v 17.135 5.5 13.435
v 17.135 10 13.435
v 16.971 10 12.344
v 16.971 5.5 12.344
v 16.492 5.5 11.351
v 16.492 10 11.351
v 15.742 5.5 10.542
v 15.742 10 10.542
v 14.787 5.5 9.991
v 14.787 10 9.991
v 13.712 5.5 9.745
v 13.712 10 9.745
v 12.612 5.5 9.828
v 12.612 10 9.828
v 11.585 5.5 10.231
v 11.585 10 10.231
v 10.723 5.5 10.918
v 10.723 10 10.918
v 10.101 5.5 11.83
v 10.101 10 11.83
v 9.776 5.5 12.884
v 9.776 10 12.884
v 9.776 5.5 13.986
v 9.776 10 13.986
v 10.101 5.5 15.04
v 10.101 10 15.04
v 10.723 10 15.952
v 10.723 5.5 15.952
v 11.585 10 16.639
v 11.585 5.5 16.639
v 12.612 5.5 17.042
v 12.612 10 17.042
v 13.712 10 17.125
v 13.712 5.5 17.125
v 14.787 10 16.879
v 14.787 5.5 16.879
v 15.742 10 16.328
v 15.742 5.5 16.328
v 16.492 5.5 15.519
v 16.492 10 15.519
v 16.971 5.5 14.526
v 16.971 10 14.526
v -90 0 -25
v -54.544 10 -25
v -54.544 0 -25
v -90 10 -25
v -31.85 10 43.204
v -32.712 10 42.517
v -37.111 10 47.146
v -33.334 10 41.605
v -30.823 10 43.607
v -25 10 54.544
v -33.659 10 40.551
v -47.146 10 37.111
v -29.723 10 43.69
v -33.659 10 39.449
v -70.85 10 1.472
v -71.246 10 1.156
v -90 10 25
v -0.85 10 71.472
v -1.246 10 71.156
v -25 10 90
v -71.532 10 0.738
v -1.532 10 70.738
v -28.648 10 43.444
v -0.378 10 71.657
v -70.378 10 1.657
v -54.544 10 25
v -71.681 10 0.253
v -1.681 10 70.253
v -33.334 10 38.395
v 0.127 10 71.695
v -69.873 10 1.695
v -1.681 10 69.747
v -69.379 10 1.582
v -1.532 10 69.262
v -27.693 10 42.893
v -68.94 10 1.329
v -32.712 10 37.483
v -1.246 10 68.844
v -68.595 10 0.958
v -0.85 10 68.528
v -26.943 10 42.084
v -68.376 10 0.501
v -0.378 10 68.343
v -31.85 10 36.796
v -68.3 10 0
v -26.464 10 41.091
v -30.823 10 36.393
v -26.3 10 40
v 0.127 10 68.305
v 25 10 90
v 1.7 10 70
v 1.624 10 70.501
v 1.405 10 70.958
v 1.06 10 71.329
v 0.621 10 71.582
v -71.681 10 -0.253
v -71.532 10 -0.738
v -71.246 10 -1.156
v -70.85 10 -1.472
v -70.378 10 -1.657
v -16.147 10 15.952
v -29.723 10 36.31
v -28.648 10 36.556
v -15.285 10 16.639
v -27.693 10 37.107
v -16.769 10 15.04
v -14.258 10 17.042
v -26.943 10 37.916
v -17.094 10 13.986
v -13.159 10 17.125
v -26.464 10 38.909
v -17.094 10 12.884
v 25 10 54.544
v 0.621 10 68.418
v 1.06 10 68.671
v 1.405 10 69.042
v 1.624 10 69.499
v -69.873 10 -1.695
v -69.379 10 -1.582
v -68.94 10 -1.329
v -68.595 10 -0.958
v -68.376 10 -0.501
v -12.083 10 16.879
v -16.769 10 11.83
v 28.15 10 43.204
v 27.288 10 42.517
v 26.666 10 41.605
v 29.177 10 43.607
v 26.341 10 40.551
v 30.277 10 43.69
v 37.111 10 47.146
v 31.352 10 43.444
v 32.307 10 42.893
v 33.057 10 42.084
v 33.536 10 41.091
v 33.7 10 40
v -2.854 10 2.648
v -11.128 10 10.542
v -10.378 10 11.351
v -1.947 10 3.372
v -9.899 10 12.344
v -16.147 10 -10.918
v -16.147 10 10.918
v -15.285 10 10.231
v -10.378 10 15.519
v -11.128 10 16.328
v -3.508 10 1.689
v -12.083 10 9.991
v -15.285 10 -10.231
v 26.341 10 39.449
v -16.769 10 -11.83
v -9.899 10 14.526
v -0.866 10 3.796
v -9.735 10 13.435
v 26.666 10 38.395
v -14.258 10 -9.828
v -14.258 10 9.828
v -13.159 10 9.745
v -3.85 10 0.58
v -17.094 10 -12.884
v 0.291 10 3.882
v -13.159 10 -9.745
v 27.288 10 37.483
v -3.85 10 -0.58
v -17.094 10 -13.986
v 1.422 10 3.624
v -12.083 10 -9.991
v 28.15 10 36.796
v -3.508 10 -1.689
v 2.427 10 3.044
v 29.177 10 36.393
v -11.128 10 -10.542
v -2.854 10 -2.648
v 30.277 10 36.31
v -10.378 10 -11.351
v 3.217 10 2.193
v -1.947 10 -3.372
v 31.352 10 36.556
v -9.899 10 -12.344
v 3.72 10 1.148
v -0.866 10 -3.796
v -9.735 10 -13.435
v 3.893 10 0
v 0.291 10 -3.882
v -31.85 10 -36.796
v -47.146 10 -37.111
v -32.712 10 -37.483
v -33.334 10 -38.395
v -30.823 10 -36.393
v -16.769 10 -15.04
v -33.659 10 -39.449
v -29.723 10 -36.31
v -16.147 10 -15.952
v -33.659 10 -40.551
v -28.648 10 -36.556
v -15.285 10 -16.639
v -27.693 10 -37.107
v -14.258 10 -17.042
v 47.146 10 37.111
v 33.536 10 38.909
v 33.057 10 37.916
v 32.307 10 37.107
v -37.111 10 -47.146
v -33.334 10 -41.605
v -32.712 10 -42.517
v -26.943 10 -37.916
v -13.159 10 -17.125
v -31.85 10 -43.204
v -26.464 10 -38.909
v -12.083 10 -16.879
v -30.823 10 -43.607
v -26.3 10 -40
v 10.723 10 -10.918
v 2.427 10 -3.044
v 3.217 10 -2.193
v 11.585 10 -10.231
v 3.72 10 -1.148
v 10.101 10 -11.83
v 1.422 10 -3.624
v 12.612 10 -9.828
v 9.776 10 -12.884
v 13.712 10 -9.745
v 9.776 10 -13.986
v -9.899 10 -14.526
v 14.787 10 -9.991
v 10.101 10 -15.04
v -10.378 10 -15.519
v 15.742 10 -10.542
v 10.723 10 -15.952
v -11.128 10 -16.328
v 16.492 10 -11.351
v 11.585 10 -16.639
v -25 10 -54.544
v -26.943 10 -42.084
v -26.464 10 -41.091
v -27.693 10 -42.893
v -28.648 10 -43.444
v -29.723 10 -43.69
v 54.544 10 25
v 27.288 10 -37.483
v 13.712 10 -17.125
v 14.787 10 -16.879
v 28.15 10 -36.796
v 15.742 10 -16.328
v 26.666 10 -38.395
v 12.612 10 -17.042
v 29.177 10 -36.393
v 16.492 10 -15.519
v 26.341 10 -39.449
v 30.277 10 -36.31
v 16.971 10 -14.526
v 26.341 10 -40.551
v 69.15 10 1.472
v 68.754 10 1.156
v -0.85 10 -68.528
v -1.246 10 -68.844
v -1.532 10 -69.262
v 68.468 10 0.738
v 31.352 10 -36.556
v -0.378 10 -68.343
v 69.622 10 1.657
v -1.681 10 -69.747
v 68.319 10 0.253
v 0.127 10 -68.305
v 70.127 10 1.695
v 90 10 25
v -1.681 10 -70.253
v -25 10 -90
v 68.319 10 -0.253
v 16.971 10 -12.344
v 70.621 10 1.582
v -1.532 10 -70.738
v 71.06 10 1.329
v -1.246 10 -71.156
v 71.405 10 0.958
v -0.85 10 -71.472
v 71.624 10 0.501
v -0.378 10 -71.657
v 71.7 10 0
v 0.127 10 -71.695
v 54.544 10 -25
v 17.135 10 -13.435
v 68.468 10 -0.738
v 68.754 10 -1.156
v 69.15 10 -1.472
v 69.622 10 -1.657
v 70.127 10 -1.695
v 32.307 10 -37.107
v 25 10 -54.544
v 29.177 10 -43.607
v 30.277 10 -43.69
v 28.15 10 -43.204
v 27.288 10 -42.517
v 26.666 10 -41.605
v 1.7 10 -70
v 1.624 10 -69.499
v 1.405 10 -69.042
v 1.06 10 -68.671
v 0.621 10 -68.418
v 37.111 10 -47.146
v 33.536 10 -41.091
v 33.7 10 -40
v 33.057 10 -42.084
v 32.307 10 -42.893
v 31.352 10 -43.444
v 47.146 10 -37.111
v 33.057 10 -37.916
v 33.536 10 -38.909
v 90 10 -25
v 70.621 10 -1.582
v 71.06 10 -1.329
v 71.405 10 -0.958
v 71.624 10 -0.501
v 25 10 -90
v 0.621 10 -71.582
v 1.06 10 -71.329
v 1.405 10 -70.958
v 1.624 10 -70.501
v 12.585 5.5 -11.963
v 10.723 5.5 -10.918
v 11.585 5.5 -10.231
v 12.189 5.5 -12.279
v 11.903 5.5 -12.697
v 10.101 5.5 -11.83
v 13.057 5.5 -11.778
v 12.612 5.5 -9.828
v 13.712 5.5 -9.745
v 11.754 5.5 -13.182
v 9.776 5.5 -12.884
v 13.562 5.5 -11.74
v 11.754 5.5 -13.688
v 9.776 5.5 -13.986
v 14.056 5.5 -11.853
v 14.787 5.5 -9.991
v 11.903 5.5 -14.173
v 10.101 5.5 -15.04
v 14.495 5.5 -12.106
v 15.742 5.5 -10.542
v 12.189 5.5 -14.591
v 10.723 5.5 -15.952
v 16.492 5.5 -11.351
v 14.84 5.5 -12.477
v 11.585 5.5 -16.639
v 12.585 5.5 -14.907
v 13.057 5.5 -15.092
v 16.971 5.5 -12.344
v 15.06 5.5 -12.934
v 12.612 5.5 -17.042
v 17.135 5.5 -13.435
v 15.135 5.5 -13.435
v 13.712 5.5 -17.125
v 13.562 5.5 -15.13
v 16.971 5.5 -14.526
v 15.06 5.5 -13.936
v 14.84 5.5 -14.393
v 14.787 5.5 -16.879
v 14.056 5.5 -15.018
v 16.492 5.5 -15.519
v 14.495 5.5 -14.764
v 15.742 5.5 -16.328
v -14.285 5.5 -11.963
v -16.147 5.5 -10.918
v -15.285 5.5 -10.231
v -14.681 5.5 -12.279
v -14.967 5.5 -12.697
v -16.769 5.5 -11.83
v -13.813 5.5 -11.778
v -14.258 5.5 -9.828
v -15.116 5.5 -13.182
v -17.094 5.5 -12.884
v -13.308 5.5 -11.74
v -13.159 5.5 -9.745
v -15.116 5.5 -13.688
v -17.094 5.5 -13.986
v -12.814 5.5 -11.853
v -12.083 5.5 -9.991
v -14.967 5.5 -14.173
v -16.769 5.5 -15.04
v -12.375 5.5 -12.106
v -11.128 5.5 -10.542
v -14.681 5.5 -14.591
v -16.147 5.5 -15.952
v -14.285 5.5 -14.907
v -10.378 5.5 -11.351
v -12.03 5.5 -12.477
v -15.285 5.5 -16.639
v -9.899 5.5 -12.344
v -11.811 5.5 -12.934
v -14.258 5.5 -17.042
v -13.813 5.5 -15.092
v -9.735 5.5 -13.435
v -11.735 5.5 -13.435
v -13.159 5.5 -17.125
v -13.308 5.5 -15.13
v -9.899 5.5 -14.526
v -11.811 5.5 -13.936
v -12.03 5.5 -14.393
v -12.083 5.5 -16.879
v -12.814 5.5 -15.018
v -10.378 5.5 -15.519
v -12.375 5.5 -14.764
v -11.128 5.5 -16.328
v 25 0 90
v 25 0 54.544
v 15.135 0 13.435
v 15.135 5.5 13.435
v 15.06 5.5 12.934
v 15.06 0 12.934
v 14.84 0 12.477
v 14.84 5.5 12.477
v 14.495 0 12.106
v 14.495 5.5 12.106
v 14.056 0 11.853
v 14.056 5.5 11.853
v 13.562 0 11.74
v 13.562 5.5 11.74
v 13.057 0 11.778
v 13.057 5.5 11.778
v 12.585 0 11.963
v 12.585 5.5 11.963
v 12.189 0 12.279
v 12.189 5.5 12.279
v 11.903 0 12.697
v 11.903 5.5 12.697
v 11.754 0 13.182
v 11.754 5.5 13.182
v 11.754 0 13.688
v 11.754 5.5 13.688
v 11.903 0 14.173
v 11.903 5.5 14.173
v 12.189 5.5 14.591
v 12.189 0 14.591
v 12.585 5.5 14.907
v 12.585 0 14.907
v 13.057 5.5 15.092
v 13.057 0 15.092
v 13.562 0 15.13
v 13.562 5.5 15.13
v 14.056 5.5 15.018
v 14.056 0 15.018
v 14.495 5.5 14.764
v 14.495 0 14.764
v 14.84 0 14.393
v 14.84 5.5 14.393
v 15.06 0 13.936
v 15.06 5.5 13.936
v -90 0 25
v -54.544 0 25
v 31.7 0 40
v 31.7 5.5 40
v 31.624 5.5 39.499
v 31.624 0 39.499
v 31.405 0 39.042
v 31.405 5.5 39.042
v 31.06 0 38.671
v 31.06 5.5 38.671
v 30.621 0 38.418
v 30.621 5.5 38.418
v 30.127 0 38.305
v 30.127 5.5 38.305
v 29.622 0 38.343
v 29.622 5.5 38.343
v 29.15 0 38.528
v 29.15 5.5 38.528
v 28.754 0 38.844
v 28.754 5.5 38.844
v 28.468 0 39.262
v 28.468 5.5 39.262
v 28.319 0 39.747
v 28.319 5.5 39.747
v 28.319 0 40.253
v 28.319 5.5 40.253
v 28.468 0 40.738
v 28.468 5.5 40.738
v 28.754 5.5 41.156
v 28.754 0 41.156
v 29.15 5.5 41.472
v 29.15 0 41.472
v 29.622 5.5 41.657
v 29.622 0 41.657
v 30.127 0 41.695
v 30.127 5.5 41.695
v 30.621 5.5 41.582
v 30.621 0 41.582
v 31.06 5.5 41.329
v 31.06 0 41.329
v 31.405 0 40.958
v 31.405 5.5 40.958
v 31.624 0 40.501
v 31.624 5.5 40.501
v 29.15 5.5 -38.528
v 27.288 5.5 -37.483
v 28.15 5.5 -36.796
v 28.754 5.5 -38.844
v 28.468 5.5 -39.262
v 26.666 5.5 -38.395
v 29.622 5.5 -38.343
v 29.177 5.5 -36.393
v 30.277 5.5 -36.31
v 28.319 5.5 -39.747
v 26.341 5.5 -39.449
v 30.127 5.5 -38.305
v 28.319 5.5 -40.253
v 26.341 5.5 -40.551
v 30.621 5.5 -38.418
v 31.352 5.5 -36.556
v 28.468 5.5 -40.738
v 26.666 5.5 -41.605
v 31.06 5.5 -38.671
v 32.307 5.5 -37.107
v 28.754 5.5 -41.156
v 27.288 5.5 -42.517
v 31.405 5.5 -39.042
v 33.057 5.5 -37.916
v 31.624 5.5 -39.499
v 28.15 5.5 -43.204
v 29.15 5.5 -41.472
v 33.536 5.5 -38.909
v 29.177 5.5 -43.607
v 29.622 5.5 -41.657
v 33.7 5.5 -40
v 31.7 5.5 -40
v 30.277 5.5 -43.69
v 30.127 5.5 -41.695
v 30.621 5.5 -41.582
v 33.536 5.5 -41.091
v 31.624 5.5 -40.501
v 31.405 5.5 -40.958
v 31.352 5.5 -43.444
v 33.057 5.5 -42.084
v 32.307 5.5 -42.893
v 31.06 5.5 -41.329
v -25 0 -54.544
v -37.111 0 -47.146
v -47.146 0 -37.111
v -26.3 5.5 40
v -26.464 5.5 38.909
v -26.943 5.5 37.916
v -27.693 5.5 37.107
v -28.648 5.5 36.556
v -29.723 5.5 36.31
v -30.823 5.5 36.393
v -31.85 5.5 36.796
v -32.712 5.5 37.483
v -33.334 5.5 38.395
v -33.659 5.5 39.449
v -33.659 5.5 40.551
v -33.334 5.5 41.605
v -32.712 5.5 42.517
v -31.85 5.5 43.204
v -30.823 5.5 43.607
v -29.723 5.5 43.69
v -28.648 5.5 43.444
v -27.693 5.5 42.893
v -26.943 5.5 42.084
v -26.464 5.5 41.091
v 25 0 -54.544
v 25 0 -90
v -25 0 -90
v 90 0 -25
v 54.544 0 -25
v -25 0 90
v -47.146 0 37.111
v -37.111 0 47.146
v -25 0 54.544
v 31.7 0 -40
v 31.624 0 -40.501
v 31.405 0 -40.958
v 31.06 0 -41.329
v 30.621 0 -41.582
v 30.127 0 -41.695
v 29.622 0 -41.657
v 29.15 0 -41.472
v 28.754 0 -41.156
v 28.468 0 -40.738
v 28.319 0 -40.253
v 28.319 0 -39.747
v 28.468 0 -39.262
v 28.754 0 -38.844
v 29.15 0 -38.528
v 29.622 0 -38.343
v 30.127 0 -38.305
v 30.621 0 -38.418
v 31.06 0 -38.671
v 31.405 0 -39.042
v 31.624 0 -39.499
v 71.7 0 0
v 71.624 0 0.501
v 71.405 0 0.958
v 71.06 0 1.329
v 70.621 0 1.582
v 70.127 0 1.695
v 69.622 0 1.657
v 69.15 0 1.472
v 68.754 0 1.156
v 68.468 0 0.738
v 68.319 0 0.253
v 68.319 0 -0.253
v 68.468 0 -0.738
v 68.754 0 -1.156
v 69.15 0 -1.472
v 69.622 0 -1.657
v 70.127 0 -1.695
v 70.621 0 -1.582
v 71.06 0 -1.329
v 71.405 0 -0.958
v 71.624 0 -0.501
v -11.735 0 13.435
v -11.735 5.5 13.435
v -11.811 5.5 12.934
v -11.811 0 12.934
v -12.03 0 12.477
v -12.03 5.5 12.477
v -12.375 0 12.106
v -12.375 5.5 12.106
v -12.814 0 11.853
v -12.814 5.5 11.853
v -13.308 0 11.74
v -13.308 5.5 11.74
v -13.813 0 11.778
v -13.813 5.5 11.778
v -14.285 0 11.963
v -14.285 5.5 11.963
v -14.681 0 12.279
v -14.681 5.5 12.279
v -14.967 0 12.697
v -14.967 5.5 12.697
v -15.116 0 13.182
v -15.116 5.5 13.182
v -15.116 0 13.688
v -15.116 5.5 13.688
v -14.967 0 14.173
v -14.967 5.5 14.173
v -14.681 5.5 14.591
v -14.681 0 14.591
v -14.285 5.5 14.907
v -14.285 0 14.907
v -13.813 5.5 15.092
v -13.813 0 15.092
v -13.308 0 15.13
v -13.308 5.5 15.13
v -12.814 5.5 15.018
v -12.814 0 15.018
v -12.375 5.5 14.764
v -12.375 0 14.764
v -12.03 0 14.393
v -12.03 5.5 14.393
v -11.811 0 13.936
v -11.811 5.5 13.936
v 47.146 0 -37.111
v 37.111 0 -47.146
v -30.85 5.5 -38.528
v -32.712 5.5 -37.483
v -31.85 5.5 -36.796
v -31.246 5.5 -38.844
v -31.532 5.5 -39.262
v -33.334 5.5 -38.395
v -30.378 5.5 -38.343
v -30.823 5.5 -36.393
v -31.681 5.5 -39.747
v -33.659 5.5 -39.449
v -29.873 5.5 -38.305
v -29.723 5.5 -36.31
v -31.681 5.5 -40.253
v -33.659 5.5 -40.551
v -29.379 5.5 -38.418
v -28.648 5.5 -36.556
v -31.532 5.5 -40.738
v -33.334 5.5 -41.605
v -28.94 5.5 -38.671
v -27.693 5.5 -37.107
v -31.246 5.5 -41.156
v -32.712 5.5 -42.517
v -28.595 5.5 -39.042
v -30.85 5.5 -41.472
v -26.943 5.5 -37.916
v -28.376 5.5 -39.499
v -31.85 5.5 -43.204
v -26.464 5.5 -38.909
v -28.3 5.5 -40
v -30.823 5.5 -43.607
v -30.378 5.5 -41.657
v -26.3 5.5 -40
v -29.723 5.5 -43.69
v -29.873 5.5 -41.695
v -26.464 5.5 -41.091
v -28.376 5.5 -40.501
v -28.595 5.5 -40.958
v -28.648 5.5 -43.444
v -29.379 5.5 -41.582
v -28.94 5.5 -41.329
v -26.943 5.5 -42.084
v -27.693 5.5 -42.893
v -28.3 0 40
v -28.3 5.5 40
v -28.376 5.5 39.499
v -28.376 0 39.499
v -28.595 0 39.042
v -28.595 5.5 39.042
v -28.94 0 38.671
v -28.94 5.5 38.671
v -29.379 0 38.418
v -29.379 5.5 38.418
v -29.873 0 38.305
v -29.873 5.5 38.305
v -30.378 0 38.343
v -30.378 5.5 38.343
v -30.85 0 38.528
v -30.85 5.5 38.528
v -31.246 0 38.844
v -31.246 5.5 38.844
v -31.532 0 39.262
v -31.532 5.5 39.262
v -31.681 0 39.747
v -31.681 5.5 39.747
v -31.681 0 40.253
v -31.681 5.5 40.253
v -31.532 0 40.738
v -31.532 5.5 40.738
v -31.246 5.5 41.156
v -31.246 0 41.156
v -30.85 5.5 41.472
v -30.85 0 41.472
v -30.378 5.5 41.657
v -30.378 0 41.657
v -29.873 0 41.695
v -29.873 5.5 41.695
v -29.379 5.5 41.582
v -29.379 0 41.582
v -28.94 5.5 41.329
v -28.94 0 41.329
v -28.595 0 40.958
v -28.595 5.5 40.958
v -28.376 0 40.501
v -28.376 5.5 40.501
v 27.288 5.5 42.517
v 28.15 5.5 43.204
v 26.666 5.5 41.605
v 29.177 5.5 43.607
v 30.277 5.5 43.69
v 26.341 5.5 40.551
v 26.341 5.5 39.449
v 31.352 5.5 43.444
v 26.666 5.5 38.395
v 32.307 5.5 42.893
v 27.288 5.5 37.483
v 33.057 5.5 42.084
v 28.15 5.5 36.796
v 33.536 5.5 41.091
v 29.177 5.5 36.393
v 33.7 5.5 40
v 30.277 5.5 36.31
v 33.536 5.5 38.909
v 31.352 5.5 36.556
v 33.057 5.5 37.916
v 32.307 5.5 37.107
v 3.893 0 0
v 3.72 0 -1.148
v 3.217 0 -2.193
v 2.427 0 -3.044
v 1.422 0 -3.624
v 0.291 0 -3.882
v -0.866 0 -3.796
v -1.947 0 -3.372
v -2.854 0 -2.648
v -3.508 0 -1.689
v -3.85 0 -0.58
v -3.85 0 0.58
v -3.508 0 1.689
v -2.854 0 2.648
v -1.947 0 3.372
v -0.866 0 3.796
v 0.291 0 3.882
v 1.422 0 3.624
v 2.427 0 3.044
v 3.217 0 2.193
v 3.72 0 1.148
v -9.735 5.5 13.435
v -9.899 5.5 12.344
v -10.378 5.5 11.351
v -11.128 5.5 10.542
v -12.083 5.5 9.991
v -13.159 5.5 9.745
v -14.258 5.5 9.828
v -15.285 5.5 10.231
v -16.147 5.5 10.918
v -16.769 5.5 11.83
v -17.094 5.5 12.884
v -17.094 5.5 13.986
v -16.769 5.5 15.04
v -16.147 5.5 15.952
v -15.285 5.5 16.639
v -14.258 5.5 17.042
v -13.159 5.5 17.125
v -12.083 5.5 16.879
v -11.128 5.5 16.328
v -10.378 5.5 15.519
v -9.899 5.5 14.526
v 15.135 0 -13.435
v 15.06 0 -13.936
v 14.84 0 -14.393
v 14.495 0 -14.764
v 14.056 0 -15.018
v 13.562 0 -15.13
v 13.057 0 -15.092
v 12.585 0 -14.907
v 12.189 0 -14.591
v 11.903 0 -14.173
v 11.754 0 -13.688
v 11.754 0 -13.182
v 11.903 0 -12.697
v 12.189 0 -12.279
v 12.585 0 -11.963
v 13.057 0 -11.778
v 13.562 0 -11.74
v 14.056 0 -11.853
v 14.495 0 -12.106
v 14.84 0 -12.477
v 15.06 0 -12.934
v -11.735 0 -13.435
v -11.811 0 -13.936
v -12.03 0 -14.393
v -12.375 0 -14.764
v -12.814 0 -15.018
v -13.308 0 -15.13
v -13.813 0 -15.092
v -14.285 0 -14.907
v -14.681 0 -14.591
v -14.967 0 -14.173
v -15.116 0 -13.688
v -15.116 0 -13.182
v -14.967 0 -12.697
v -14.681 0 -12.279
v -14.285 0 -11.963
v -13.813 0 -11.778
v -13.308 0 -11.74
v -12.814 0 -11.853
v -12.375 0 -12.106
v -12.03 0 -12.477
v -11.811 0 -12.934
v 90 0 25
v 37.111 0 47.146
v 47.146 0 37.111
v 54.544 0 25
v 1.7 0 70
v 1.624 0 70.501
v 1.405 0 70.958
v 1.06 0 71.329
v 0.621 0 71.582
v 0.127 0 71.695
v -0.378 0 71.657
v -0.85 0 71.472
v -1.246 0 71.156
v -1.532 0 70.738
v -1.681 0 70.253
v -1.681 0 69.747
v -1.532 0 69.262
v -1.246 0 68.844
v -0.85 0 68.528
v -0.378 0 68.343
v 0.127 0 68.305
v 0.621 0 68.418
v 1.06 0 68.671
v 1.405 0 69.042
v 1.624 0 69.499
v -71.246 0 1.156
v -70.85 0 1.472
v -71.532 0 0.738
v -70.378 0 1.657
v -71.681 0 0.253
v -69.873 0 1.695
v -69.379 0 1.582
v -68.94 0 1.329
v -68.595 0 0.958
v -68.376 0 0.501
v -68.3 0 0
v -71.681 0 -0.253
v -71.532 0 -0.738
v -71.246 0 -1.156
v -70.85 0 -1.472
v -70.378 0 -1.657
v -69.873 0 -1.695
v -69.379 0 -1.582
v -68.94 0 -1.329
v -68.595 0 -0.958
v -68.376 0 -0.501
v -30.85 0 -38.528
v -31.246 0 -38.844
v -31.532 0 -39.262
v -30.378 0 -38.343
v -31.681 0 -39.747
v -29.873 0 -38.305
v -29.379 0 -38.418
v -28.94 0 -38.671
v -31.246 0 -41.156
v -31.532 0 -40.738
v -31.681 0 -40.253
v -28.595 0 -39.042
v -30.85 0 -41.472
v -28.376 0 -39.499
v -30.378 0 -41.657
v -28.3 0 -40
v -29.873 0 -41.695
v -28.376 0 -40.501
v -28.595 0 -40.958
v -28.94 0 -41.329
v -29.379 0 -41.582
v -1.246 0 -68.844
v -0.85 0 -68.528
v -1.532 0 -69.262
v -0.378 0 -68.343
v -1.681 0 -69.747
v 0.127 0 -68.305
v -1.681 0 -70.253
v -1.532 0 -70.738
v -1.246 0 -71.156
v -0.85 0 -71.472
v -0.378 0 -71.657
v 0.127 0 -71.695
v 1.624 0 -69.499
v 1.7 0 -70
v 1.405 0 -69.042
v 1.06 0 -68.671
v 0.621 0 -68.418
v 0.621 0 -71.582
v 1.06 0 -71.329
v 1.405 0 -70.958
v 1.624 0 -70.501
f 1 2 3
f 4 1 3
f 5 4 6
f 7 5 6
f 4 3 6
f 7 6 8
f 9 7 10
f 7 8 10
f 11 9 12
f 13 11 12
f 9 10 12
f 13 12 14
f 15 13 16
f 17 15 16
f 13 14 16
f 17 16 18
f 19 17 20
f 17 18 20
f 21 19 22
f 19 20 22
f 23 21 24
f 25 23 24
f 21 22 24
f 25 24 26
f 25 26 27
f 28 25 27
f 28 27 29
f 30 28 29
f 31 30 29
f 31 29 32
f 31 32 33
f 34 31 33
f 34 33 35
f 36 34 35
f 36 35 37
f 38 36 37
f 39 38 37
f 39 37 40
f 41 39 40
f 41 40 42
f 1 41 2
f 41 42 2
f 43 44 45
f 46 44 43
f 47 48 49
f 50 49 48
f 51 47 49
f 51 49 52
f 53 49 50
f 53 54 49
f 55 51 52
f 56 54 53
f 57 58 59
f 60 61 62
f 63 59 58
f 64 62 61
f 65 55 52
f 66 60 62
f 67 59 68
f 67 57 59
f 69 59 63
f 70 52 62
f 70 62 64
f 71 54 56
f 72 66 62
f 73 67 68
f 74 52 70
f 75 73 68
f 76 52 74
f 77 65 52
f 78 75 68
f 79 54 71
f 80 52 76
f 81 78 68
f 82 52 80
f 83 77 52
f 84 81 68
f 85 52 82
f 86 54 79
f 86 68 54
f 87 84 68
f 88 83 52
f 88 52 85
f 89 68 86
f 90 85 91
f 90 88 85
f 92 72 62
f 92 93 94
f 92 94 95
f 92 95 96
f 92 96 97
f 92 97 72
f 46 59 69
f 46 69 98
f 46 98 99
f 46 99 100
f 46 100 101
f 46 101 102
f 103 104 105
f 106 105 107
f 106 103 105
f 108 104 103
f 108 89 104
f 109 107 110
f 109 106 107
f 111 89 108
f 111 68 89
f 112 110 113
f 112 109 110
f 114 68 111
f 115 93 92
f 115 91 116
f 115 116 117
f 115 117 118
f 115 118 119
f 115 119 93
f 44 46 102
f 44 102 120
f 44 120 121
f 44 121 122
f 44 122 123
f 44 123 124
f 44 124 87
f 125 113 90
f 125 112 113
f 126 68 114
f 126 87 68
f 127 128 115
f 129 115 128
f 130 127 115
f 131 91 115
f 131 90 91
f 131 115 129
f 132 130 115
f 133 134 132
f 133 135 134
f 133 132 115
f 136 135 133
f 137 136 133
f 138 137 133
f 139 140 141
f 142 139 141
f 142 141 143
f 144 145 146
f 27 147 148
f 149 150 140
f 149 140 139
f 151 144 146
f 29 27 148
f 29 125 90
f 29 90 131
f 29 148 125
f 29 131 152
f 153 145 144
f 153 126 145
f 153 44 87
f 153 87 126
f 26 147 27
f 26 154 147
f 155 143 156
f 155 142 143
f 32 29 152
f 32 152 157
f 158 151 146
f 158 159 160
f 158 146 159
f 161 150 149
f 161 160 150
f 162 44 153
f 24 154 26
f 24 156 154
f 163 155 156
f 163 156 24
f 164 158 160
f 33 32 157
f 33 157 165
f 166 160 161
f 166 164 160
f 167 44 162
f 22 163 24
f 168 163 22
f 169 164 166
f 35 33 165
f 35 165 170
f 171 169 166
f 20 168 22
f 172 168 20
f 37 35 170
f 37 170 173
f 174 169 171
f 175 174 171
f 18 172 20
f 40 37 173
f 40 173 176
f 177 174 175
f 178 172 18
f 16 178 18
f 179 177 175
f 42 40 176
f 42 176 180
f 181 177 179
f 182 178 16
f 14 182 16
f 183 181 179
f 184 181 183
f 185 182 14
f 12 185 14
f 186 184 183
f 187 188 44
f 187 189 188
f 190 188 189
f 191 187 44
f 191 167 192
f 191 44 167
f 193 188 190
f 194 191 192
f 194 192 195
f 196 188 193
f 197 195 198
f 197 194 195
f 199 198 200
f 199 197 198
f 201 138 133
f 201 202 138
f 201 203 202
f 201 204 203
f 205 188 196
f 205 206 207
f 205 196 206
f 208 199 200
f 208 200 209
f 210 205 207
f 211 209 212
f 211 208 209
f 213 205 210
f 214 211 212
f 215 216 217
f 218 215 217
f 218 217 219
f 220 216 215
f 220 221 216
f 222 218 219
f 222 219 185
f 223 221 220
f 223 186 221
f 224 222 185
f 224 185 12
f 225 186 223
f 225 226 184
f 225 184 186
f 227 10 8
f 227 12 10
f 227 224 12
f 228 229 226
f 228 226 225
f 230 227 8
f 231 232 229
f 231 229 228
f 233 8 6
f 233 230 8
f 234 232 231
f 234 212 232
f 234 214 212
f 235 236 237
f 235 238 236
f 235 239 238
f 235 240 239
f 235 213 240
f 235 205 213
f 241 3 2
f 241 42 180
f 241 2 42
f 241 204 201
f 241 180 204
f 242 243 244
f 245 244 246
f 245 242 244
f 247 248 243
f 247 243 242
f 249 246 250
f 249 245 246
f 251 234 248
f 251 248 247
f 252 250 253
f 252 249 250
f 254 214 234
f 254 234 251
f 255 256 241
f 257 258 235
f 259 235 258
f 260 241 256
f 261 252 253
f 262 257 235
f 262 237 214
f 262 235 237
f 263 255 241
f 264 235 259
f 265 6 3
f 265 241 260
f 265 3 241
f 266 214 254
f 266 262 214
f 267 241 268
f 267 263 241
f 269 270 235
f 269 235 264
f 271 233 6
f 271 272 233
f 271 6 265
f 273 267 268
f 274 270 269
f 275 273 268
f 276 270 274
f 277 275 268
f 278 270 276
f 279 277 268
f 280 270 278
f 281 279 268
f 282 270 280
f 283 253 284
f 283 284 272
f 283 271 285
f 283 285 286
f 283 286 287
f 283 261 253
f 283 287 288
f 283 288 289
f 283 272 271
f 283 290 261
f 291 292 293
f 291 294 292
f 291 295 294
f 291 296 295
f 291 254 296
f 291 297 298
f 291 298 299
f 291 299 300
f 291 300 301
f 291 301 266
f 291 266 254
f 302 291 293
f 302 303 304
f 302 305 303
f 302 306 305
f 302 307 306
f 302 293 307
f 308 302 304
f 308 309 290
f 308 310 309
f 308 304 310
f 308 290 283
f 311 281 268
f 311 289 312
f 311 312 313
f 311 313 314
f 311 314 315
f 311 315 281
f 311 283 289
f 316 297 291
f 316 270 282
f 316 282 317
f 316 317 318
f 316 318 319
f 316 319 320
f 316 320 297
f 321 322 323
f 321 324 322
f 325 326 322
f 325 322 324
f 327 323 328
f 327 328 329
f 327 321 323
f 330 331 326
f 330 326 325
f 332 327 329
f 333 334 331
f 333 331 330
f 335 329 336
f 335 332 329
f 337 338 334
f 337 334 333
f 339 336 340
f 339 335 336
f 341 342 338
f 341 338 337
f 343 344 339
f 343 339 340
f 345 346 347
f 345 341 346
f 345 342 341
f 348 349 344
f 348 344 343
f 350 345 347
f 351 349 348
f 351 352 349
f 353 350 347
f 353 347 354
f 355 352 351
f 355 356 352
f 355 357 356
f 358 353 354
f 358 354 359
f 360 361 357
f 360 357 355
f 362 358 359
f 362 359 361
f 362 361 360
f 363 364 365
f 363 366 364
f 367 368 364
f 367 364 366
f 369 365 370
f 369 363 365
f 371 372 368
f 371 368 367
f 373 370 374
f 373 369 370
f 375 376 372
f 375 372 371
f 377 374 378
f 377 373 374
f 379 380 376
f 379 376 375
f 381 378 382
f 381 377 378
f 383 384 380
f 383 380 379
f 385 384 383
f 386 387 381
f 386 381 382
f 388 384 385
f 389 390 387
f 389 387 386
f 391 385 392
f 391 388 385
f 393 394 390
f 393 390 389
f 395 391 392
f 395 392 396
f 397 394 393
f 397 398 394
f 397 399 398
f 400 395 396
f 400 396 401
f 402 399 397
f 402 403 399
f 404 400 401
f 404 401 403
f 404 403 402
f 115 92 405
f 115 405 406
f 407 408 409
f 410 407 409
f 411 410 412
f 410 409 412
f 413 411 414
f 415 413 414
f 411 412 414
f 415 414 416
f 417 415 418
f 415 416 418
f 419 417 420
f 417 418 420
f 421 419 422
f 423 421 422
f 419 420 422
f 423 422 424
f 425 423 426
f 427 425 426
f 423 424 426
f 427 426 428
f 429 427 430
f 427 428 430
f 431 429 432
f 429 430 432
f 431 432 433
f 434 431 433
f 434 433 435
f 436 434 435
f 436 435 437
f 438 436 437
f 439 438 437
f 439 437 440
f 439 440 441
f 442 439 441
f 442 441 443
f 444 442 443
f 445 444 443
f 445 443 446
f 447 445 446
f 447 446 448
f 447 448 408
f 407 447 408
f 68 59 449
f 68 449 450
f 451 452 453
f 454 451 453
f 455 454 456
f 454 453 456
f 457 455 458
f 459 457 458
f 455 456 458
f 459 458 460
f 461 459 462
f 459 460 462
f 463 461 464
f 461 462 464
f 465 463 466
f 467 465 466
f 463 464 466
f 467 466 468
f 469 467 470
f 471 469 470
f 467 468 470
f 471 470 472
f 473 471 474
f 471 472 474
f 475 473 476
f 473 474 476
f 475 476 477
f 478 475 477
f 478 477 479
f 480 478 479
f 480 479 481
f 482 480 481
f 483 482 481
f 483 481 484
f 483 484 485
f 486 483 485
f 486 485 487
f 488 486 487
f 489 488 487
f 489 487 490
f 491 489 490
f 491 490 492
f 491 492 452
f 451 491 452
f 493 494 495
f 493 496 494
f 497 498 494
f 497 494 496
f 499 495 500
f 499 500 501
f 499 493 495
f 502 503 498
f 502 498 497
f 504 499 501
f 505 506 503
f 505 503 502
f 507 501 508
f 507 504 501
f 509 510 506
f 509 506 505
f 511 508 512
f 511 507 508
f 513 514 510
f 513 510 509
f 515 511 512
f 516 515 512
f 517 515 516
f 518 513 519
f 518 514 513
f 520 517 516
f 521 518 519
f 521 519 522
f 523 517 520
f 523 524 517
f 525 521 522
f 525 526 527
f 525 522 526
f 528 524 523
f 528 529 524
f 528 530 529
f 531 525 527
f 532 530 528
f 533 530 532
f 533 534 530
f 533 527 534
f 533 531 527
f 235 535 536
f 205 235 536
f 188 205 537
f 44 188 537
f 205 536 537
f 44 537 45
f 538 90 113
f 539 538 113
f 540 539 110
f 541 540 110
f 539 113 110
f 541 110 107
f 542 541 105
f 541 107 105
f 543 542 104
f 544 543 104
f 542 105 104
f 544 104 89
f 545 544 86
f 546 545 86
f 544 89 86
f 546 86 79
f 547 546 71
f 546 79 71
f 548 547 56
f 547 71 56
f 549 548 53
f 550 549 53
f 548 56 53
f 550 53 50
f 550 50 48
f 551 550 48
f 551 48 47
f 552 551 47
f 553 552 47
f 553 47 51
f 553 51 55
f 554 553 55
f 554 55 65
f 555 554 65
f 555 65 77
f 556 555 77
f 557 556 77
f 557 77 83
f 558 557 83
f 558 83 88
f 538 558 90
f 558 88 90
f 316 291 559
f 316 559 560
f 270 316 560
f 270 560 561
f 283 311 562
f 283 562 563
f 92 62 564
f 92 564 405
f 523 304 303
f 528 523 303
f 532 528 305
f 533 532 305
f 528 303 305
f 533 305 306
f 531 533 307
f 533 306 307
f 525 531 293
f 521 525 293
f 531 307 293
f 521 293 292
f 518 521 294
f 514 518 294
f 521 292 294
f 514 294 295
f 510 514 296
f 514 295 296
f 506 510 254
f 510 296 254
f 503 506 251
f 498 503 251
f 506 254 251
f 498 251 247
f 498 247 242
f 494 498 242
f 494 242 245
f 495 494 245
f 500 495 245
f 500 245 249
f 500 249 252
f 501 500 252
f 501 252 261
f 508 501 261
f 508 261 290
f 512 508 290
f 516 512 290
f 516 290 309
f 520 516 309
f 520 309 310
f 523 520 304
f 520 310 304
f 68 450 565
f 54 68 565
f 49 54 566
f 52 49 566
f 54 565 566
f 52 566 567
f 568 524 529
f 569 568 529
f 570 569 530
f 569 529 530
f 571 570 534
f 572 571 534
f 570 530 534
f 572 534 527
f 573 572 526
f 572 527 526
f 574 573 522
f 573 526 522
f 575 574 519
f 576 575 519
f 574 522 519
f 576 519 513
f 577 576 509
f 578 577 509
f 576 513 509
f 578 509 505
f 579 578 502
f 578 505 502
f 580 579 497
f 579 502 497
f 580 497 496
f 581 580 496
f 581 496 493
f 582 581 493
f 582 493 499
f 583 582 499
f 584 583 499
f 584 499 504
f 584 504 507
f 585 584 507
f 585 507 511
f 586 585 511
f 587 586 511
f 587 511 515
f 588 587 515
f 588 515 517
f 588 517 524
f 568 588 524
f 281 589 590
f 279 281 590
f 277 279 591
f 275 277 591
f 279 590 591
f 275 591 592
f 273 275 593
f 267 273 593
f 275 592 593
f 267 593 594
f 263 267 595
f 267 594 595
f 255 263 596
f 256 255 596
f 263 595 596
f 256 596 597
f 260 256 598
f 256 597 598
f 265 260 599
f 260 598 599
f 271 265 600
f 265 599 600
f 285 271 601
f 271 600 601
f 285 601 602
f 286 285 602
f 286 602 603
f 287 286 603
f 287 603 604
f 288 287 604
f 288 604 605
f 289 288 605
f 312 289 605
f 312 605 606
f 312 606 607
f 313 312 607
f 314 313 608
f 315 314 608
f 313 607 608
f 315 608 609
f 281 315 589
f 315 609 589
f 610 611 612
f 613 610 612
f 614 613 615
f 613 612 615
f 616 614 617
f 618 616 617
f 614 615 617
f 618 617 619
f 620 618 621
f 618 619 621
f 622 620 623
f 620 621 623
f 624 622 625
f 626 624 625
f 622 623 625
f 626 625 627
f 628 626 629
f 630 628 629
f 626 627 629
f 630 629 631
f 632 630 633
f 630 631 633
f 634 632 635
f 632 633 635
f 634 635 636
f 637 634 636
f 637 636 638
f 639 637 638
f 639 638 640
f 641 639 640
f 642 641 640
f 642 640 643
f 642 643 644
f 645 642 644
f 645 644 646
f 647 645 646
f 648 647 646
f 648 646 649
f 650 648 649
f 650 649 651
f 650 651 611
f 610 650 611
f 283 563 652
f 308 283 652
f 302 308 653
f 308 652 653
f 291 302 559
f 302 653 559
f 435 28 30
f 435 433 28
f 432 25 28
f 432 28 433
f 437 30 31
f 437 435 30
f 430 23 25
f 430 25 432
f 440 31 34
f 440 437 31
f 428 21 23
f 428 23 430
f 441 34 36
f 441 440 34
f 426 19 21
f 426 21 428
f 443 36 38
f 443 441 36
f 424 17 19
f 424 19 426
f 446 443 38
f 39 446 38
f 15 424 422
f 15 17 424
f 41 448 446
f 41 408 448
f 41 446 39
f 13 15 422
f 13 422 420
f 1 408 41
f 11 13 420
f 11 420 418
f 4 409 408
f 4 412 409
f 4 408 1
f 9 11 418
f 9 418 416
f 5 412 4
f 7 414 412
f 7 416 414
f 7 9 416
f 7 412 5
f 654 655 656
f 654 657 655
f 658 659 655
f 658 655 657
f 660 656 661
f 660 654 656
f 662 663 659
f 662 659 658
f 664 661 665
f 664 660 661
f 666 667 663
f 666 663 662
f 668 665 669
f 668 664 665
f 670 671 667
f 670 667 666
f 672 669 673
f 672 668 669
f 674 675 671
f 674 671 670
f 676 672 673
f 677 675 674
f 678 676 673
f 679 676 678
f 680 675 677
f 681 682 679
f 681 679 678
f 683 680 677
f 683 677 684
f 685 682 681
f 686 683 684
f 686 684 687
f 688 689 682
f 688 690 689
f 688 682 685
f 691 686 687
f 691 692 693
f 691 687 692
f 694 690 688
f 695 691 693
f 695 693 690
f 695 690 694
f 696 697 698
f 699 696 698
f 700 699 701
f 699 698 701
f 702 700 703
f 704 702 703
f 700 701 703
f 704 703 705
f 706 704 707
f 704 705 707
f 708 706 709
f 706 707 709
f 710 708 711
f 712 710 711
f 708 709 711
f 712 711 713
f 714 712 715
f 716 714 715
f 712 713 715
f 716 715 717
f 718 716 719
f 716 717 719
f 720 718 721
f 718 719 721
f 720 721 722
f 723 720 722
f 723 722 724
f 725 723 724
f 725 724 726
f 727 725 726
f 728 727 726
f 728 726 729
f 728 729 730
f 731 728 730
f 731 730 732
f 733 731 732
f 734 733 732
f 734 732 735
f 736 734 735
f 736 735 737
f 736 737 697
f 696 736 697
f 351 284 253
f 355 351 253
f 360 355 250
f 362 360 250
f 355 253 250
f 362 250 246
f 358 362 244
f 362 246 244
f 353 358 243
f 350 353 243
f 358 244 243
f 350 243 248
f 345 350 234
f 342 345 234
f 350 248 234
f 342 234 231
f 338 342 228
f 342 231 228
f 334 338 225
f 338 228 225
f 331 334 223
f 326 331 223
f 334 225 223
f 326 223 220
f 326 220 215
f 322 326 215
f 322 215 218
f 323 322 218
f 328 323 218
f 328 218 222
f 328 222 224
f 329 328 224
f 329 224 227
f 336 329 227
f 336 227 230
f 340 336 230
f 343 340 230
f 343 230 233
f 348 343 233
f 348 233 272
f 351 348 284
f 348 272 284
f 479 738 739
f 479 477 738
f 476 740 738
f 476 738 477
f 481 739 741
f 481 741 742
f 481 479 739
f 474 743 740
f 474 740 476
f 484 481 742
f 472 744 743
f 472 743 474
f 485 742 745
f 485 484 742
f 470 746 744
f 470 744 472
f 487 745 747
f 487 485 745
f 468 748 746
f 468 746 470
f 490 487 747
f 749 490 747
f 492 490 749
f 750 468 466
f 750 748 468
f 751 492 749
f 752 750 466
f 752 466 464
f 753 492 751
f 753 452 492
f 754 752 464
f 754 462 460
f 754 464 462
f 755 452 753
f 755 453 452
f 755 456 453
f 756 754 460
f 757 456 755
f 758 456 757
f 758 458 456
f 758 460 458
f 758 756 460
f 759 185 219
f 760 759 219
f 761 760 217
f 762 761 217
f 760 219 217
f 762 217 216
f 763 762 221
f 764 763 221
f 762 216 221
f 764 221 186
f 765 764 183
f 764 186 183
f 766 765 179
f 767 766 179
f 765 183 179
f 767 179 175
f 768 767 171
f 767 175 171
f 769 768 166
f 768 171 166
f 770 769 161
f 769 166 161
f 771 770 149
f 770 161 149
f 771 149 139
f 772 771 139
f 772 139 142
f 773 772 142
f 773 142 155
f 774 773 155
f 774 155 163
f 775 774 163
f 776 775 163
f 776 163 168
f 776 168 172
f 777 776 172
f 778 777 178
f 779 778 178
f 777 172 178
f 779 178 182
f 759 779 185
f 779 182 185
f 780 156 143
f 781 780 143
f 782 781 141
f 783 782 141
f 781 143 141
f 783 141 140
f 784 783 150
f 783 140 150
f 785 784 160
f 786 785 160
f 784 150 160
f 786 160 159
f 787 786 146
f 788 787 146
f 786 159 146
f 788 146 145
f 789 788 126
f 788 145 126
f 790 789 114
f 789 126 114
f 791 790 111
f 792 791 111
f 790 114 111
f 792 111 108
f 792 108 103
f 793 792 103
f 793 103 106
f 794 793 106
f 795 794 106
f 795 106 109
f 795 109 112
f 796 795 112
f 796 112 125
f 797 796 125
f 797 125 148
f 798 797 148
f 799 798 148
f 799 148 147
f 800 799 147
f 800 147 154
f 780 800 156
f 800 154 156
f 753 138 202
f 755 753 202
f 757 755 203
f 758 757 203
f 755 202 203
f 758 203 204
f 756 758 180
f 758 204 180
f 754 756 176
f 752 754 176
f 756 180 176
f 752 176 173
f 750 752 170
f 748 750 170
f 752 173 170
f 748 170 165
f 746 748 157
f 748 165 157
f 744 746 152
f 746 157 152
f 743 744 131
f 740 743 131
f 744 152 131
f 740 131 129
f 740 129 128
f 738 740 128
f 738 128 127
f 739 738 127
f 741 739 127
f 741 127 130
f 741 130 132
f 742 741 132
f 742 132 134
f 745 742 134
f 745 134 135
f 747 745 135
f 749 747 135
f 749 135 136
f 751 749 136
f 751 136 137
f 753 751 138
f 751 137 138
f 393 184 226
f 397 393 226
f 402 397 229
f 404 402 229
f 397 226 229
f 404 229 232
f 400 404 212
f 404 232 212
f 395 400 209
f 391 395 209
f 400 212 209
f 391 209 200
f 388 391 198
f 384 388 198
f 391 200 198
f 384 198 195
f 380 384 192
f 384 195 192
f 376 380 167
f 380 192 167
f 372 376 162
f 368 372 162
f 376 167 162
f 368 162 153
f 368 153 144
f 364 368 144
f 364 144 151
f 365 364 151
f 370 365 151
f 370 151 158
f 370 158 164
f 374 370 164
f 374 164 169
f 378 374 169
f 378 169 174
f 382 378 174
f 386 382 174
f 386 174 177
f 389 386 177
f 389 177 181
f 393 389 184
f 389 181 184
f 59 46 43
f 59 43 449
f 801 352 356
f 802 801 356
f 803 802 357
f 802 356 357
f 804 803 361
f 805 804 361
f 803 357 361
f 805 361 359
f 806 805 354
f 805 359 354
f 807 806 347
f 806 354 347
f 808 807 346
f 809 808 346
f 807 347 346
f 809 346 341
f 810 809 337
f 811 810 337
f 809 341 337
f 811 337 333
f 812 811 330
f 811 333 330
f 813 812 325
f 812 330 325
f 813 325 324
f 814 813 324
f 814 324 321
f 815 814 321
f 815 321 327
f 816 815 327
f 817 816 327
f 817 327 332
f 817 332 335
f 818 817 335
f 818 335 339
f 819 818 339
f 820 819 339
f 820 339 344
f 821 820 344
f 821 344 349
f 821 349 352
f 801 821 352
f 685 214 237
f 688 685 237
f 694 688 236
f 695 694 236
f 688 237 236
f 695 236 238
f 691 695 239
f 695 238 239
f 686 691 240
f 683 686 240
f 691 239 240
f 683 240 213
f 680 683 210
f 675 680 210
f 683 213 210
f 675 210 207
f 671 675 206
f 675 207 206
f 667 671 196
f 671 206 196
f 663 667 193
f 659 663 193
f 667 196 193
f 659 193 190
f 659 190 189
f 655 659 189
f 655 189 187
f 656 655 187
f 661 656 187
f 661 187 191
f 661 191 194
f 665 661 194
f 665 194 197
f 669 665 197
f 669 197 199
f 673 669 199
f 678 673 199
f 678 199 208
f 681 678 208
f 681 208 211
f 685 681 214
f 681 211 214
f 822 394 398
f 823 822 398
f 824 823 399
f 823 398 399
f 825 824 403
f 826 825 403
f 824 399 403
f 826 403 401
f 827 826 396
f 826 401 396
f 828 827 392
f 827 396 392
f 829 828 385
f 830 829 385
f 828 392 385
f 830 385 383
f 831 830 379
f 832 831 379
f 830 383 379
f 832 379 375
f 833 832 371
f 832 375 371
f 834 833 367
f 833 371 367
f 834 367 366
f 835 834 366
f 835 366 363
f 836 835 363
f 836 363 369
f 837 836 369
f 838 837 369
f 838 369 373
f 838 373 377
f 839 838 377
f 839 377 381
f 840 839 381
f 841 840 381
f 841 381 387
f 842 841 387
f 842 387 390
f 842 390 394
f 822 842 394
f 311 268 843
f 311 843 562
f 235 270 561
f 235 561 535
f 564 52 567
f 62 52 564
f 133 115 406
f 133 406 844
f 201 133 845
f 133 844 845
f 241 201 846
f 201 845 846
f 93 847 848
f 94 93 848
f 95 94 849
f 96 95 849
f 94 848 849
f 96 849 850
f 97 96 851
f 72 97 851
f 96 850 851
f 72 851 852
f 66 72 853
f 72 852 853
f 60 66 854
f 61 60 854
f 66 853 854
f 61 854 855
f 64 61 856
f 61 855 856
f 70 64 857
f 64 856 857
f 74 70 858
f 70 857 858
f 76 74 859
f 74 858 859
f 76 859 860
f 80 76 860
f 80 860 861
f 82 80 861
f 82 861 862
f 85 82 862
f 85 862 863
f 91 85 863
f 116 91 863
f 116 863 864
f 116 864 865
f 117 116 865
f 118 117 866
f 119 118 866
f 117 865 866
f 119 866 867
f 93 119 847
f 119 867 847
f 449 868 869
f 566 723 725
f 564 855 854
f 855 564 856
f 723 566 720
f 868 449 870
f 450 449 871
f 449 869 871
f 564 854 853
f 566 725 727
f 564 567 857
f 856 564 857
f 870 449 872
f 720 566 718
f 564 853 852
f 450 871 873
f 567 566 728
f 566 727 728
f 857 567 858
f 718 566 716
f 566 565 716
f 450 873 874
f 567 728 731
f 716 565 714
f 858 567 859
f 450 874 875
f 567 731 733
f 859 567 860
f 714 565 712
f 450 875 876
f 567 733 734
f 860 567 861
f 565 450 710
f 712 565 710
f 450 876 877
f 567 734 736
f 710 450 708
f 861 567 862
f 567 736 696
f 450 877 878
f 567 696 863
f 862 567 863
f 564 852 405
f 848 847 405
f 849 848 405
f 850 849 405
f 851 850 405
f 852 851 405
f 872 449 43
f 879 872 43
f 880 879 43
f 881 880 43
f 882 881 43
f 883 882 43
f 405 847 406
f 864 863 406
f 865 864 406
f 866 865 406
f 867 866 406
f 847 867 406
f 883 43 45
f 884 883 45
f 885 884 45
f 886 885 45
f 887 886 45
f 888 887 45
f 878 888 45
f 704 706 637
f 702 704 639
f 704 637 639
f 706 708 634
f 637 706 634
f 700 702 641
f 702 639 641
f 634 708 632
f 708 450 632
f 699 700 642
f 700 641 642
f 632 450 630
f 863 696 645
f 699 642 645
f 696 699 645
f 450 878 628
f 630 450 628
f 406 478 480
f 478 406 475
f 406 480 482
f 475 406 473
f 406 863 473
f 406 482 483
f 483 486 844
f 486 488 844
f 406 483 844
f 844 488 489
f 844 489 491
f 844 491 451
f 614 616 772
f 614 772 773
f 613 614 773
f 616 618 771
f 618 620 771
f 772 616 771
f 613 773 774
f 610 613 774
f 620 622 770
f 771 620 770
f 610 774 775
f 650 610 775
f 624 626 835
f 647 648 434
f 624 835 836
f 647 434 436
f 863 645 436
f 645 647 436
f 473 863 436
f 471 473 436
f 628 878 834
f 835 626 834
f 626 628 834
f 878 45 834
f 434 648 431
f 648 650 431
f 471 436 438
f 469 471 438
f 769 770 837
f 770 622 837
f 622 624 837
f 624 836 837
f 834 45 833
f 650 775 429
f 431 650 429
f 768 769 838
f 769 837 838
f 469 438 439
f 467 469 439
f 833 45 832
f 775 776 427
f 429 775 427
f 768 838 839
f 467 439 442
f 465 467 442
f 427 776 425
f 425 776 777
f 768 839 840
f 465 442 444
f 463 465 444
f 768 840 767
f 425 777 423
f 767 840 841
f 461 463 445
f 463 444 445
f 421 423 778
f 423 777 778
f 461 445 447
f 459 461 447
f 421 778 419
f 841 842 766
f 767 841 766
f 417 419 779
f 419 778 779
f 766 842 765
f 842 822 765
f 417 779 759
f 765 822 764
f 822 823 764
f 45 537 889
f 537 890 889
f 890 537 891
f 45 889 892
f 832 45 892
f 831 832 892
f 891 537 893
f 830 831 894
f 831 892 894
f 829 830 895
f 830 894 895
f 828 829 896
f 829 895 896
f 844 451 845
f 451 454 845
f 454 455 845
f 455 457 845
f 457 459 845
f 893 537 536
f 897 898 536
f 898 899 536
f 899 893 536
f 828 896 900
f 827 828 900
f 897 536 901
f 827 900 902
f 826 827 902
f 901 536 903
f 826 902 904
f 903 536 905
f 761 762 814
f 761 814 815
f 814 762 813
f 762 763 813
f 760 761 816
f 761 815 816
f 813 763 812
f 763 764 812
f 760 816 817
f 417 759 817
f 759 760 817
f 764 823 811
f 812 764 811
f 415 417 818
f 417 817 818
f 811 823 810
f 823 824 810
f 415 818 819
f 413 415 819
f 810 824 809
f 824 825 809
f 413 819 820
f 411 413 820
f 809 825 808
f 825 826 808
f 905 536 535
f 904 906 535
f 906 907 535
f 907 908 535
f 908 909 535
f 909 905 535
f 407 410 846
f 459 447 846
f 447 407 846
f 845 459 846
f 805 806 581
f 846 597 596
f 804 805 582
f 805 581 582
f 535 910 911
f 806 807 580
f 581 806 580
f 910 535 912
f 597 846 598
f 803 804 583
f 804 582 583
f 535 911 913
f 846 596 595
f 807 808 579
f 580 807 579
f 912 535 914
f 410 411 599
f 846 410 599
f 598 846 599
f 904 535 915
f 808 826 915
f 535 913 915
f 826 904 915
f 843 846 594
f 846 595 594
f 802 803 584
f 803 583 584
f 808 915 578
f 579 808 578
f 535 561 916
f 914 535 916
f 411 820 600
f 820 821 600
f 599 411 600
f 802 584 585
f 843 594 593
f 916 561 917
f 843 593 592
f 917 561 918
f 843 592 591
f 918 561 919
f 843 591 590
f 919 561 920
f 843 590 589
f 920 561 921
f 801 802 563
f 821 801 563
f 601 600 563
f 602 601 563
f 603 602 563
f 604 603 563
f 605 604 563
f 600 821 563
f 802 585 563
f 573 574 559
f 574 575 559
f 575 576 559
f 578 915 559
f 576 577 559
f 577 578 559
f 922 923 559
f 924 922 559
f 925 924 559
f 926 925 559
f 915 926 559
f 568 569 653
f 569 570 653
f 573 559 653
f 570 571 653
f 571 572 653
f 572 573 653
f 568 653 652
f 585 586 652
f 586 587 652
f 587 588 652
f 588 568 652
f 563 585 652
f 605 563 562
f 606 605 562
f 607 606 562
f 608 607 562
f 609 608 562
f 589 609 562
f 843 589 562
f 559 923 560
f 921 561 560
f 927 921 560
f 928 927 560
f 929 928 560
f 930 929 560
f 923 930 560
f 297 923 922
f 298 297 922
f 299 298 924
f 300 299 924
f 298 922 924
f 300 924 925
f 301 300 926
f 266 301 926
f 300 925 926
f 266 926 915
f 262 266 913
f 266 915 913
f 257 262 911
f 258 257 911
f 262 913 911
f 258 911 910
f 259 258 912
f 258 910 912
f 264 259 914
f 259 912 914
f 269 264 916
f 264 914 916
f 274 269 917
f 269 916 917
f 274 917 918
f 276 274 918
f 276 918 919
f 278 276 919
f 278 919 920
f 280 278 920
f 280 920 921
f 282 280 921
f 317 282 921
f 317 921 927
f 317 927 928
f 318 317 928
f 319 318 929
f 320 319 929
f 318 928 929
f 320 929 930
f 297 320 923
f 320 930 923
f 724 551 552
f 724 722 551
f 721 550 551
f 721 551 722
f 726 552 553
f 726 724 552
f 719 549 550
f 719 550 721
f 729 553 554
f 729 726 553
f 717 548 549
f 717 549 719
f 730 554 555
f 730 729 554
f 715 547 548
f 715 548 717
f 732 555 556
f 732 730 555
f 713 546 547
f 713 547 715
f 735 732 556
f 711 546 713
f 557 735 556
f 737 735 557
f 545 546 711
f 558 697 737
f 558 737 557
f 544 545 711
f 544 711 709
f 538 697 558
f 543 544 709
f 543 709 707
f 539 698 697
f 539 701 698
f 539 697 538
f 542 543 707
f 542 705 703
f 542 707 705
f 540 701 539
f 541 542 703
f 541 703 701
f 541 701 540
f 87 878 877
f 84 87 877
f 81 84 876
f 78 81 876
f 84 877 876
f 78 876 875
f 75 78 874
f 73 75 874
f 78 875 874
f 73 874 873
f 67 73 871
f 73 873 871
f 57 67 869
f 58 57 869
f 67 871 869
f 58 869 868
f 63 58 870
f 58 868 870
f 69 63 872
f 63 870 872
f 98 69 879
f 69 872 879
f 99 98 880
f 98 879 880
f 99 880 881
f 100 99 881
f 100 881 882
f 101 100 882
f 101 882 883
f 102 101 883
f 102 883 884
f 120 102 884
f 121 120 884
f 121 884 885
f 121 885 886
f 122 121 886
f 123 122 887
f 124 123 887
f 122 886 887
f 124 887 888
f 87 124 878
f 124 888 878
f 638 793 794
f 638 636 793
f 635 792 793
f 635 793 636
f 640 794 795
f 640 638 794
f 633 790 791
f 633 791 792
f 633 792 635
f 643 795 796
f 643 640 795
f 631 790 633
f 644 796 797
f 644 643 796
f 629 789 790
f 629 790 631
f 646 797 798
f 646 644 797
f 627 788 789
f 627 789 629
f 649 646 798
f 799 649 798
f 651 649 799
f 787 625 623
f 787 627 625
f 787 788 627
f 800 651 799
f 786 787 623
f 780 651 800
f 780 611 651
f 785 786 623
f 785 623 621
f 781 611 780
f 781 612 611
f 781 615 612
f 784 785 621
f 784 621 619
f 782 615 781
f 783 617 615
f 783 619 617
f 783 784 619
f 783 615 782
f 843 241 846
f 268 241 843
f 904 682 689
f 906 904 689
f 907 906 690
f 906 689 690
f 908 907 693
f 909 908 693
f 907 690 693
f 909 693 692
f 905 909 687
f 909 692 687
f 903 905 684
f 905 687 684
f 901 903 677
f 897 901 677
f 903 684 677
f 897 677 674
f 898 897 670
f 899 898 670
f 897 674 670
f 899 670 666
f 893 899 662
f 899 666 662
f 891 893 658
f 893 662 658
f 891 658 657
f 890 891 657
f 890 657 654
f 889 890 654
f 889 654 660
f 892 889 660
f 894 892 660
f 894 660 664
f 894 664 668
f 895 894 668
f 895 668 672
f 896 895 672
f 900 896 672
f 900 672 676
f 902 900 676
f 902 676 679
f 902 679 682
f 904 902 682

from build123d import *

# Parameters (mm, degrees)
SKETCH_1_R          = 60
EXTRUDE_1_DEPTH     = 10
SKETCH_2_R          = 1.7
SKETCH_2_R_2        = 3.925573477
CUT_EXTRUDE_1_DEPTH = 10
SKETCH_3_R          = 1.7
CUT_EXTRUDE_2_DEPTH = 10
SKETCH_4_R          = 3.7
CUT_EXTRUDE_3_DEPTH = 4.5
SKETCH_5_R          = 3.893175391
SKETCH_5_R_2        = 3.7
EXTRUDE_2_DEPTH     = 10
SKETCH_6_R          = 1.7
CUT_EXTRUDE_4_DEPTH = 10


with BuildPart() as part:
    # 草图1 → 凸台-拉伸1 (new body)
    with BuildSketch(Plane(origin=(0, 0, 0), x_dir=(1, 0, 0), z_dir=(0, 1, 0))):
        Circle(SKETCH_1_R)
    extrude(amount=EXTRUDE_1_DEPTH)

    # 草图2 → 切除-拉伸1 (cut)
    with BuildSketch(Plane(origin=(0, 10, 0), x_dir=(1, 0, 0), z_dir=(0, 1, 0))):
        with Locations((-13.435028843, 13.435028843)):
            Circle(SKETCH_2_R)
        Circle(SKETCH_2_R_2)
        with Locations((13.435028843, 13.435028843)):
            Circle(SKETCH_2_R)
        with Locations((13.435028843, -13.435028843)):
            Circle(SKETCH_2_R)
        with Locations((-13.435028843, -13.435028843)):
            Circle(SKETCH_2_R)
    extrude(amount=-CUT_EXTRUDE_1_DEPTH, mode=Mode.SUBTRACT)

    # 草图3 → 切除-拉伸2 (cut)
    with BuildSketch(Plane(origin=(0, 10, 0), x_dir=(1, 0, 0), z_dir=(0, 1, 0))):
        with Locations((-30, 40)):
            Circle(SKETCH_3_R)
        with Locations((30, 40)):
            Circle(SKETCH_3_R)
        with Locations((-30, -40)):
            Circle(SKETCH_3_R)
        with Locations((30, -40)):
            Circle(SKETCH_3_R)
    extrude(amount=-CUT_EXTRUDE_2_DEPTH, mode=Mode.SUBTRACT)

    # 草图4 → 切除-拉伸3 (cut)
    with BuildSketch(Plane(origin=(0, 10, 0), x_dir=(1, 0, 0), z_dir=(0, 1, 0))):
        with Locations((-13.435028843, 13.435028843)):
            Circle(SKETCH_4_R)
        with Locations((13.435028843, 13.435028843)):
            Circle(SKETCH_4_R)
        with Locations((13.435028843, -13.435028843)):
            Circle(SKETCH_4_R)
        with Locations((-13.435028843, -13.435028843)):
            Circle(SKETCH_4_R)
        with Locations((-30, 40)):
            Circle(SKETCH_4_R)
        with Locations((30, 40)):
            Circle(SKETCH_4_R)
        with Locations((-30, -40)):
            Circle(SKETCH_4_R)
        with Locations((30, -40)):
            Circle(SKETCH_4_R)
    extrude(amount=-CUT_EXTRUDE_3_DEPTH, mode=Mode.SUBTRACT)

    # 草图5 → 凸台-拉伸2 (add)
    with BuildSketch(Plane(origin=(0, 10, 0), x_dir=(1, 0, 0), z_dir=(0, 1, 0))):
        Polygon((25, 25), (25, 90), (-25, 90), (-25, 25), (-90, 25), (-90, -25), (-25, -25), (-25, -90), (25, -90), (25, -25), (90, -25), (90, 25), align=None)
        Circle(SKETCH_5_R, mode=Mode.SUBTRACT)
        with Locations((13.435028843, 13.435028843)):
            Circle(SKETCH_5_R_2, mode=Mode.SUBTRACT)
        with Locations((-13.435028843, 13.435028843)):
            Circle(SKETCH_5_R_2, mode=Mode.SUBTRACT)
        with Locations((-13.435028843, -13.435028843)):
            Circle(SKETCH_5_R_2, mode=Mode.SUBTRACT)
        with Locations((13.435028843, -13.435028843)):
            Circle(SKETCH_5_R_2, mode=Mode.SUBTRACT)
    extrude(amount=-EXTRUDE_2_DEPTH)

    # 草图6 → 切除-拉伸4 (cut)
    with BuildSketch(Plane.XZ):
        with Locations((0, -70)):
            Circle(SKETCH_6_R)
        with Locations((-70, 0)):
            Circle(SKETCH_6_R)
        with Locations((0, 70)):
            Circle(SKETCH_6_R)
        with Locations((70, 0)):
            Circle(SKETCH_6_R)
    extrude(amount=-CUT_EXTRUDE_4_DEPTH, mode=Mode.SUBTRACT)


solid = part.part
